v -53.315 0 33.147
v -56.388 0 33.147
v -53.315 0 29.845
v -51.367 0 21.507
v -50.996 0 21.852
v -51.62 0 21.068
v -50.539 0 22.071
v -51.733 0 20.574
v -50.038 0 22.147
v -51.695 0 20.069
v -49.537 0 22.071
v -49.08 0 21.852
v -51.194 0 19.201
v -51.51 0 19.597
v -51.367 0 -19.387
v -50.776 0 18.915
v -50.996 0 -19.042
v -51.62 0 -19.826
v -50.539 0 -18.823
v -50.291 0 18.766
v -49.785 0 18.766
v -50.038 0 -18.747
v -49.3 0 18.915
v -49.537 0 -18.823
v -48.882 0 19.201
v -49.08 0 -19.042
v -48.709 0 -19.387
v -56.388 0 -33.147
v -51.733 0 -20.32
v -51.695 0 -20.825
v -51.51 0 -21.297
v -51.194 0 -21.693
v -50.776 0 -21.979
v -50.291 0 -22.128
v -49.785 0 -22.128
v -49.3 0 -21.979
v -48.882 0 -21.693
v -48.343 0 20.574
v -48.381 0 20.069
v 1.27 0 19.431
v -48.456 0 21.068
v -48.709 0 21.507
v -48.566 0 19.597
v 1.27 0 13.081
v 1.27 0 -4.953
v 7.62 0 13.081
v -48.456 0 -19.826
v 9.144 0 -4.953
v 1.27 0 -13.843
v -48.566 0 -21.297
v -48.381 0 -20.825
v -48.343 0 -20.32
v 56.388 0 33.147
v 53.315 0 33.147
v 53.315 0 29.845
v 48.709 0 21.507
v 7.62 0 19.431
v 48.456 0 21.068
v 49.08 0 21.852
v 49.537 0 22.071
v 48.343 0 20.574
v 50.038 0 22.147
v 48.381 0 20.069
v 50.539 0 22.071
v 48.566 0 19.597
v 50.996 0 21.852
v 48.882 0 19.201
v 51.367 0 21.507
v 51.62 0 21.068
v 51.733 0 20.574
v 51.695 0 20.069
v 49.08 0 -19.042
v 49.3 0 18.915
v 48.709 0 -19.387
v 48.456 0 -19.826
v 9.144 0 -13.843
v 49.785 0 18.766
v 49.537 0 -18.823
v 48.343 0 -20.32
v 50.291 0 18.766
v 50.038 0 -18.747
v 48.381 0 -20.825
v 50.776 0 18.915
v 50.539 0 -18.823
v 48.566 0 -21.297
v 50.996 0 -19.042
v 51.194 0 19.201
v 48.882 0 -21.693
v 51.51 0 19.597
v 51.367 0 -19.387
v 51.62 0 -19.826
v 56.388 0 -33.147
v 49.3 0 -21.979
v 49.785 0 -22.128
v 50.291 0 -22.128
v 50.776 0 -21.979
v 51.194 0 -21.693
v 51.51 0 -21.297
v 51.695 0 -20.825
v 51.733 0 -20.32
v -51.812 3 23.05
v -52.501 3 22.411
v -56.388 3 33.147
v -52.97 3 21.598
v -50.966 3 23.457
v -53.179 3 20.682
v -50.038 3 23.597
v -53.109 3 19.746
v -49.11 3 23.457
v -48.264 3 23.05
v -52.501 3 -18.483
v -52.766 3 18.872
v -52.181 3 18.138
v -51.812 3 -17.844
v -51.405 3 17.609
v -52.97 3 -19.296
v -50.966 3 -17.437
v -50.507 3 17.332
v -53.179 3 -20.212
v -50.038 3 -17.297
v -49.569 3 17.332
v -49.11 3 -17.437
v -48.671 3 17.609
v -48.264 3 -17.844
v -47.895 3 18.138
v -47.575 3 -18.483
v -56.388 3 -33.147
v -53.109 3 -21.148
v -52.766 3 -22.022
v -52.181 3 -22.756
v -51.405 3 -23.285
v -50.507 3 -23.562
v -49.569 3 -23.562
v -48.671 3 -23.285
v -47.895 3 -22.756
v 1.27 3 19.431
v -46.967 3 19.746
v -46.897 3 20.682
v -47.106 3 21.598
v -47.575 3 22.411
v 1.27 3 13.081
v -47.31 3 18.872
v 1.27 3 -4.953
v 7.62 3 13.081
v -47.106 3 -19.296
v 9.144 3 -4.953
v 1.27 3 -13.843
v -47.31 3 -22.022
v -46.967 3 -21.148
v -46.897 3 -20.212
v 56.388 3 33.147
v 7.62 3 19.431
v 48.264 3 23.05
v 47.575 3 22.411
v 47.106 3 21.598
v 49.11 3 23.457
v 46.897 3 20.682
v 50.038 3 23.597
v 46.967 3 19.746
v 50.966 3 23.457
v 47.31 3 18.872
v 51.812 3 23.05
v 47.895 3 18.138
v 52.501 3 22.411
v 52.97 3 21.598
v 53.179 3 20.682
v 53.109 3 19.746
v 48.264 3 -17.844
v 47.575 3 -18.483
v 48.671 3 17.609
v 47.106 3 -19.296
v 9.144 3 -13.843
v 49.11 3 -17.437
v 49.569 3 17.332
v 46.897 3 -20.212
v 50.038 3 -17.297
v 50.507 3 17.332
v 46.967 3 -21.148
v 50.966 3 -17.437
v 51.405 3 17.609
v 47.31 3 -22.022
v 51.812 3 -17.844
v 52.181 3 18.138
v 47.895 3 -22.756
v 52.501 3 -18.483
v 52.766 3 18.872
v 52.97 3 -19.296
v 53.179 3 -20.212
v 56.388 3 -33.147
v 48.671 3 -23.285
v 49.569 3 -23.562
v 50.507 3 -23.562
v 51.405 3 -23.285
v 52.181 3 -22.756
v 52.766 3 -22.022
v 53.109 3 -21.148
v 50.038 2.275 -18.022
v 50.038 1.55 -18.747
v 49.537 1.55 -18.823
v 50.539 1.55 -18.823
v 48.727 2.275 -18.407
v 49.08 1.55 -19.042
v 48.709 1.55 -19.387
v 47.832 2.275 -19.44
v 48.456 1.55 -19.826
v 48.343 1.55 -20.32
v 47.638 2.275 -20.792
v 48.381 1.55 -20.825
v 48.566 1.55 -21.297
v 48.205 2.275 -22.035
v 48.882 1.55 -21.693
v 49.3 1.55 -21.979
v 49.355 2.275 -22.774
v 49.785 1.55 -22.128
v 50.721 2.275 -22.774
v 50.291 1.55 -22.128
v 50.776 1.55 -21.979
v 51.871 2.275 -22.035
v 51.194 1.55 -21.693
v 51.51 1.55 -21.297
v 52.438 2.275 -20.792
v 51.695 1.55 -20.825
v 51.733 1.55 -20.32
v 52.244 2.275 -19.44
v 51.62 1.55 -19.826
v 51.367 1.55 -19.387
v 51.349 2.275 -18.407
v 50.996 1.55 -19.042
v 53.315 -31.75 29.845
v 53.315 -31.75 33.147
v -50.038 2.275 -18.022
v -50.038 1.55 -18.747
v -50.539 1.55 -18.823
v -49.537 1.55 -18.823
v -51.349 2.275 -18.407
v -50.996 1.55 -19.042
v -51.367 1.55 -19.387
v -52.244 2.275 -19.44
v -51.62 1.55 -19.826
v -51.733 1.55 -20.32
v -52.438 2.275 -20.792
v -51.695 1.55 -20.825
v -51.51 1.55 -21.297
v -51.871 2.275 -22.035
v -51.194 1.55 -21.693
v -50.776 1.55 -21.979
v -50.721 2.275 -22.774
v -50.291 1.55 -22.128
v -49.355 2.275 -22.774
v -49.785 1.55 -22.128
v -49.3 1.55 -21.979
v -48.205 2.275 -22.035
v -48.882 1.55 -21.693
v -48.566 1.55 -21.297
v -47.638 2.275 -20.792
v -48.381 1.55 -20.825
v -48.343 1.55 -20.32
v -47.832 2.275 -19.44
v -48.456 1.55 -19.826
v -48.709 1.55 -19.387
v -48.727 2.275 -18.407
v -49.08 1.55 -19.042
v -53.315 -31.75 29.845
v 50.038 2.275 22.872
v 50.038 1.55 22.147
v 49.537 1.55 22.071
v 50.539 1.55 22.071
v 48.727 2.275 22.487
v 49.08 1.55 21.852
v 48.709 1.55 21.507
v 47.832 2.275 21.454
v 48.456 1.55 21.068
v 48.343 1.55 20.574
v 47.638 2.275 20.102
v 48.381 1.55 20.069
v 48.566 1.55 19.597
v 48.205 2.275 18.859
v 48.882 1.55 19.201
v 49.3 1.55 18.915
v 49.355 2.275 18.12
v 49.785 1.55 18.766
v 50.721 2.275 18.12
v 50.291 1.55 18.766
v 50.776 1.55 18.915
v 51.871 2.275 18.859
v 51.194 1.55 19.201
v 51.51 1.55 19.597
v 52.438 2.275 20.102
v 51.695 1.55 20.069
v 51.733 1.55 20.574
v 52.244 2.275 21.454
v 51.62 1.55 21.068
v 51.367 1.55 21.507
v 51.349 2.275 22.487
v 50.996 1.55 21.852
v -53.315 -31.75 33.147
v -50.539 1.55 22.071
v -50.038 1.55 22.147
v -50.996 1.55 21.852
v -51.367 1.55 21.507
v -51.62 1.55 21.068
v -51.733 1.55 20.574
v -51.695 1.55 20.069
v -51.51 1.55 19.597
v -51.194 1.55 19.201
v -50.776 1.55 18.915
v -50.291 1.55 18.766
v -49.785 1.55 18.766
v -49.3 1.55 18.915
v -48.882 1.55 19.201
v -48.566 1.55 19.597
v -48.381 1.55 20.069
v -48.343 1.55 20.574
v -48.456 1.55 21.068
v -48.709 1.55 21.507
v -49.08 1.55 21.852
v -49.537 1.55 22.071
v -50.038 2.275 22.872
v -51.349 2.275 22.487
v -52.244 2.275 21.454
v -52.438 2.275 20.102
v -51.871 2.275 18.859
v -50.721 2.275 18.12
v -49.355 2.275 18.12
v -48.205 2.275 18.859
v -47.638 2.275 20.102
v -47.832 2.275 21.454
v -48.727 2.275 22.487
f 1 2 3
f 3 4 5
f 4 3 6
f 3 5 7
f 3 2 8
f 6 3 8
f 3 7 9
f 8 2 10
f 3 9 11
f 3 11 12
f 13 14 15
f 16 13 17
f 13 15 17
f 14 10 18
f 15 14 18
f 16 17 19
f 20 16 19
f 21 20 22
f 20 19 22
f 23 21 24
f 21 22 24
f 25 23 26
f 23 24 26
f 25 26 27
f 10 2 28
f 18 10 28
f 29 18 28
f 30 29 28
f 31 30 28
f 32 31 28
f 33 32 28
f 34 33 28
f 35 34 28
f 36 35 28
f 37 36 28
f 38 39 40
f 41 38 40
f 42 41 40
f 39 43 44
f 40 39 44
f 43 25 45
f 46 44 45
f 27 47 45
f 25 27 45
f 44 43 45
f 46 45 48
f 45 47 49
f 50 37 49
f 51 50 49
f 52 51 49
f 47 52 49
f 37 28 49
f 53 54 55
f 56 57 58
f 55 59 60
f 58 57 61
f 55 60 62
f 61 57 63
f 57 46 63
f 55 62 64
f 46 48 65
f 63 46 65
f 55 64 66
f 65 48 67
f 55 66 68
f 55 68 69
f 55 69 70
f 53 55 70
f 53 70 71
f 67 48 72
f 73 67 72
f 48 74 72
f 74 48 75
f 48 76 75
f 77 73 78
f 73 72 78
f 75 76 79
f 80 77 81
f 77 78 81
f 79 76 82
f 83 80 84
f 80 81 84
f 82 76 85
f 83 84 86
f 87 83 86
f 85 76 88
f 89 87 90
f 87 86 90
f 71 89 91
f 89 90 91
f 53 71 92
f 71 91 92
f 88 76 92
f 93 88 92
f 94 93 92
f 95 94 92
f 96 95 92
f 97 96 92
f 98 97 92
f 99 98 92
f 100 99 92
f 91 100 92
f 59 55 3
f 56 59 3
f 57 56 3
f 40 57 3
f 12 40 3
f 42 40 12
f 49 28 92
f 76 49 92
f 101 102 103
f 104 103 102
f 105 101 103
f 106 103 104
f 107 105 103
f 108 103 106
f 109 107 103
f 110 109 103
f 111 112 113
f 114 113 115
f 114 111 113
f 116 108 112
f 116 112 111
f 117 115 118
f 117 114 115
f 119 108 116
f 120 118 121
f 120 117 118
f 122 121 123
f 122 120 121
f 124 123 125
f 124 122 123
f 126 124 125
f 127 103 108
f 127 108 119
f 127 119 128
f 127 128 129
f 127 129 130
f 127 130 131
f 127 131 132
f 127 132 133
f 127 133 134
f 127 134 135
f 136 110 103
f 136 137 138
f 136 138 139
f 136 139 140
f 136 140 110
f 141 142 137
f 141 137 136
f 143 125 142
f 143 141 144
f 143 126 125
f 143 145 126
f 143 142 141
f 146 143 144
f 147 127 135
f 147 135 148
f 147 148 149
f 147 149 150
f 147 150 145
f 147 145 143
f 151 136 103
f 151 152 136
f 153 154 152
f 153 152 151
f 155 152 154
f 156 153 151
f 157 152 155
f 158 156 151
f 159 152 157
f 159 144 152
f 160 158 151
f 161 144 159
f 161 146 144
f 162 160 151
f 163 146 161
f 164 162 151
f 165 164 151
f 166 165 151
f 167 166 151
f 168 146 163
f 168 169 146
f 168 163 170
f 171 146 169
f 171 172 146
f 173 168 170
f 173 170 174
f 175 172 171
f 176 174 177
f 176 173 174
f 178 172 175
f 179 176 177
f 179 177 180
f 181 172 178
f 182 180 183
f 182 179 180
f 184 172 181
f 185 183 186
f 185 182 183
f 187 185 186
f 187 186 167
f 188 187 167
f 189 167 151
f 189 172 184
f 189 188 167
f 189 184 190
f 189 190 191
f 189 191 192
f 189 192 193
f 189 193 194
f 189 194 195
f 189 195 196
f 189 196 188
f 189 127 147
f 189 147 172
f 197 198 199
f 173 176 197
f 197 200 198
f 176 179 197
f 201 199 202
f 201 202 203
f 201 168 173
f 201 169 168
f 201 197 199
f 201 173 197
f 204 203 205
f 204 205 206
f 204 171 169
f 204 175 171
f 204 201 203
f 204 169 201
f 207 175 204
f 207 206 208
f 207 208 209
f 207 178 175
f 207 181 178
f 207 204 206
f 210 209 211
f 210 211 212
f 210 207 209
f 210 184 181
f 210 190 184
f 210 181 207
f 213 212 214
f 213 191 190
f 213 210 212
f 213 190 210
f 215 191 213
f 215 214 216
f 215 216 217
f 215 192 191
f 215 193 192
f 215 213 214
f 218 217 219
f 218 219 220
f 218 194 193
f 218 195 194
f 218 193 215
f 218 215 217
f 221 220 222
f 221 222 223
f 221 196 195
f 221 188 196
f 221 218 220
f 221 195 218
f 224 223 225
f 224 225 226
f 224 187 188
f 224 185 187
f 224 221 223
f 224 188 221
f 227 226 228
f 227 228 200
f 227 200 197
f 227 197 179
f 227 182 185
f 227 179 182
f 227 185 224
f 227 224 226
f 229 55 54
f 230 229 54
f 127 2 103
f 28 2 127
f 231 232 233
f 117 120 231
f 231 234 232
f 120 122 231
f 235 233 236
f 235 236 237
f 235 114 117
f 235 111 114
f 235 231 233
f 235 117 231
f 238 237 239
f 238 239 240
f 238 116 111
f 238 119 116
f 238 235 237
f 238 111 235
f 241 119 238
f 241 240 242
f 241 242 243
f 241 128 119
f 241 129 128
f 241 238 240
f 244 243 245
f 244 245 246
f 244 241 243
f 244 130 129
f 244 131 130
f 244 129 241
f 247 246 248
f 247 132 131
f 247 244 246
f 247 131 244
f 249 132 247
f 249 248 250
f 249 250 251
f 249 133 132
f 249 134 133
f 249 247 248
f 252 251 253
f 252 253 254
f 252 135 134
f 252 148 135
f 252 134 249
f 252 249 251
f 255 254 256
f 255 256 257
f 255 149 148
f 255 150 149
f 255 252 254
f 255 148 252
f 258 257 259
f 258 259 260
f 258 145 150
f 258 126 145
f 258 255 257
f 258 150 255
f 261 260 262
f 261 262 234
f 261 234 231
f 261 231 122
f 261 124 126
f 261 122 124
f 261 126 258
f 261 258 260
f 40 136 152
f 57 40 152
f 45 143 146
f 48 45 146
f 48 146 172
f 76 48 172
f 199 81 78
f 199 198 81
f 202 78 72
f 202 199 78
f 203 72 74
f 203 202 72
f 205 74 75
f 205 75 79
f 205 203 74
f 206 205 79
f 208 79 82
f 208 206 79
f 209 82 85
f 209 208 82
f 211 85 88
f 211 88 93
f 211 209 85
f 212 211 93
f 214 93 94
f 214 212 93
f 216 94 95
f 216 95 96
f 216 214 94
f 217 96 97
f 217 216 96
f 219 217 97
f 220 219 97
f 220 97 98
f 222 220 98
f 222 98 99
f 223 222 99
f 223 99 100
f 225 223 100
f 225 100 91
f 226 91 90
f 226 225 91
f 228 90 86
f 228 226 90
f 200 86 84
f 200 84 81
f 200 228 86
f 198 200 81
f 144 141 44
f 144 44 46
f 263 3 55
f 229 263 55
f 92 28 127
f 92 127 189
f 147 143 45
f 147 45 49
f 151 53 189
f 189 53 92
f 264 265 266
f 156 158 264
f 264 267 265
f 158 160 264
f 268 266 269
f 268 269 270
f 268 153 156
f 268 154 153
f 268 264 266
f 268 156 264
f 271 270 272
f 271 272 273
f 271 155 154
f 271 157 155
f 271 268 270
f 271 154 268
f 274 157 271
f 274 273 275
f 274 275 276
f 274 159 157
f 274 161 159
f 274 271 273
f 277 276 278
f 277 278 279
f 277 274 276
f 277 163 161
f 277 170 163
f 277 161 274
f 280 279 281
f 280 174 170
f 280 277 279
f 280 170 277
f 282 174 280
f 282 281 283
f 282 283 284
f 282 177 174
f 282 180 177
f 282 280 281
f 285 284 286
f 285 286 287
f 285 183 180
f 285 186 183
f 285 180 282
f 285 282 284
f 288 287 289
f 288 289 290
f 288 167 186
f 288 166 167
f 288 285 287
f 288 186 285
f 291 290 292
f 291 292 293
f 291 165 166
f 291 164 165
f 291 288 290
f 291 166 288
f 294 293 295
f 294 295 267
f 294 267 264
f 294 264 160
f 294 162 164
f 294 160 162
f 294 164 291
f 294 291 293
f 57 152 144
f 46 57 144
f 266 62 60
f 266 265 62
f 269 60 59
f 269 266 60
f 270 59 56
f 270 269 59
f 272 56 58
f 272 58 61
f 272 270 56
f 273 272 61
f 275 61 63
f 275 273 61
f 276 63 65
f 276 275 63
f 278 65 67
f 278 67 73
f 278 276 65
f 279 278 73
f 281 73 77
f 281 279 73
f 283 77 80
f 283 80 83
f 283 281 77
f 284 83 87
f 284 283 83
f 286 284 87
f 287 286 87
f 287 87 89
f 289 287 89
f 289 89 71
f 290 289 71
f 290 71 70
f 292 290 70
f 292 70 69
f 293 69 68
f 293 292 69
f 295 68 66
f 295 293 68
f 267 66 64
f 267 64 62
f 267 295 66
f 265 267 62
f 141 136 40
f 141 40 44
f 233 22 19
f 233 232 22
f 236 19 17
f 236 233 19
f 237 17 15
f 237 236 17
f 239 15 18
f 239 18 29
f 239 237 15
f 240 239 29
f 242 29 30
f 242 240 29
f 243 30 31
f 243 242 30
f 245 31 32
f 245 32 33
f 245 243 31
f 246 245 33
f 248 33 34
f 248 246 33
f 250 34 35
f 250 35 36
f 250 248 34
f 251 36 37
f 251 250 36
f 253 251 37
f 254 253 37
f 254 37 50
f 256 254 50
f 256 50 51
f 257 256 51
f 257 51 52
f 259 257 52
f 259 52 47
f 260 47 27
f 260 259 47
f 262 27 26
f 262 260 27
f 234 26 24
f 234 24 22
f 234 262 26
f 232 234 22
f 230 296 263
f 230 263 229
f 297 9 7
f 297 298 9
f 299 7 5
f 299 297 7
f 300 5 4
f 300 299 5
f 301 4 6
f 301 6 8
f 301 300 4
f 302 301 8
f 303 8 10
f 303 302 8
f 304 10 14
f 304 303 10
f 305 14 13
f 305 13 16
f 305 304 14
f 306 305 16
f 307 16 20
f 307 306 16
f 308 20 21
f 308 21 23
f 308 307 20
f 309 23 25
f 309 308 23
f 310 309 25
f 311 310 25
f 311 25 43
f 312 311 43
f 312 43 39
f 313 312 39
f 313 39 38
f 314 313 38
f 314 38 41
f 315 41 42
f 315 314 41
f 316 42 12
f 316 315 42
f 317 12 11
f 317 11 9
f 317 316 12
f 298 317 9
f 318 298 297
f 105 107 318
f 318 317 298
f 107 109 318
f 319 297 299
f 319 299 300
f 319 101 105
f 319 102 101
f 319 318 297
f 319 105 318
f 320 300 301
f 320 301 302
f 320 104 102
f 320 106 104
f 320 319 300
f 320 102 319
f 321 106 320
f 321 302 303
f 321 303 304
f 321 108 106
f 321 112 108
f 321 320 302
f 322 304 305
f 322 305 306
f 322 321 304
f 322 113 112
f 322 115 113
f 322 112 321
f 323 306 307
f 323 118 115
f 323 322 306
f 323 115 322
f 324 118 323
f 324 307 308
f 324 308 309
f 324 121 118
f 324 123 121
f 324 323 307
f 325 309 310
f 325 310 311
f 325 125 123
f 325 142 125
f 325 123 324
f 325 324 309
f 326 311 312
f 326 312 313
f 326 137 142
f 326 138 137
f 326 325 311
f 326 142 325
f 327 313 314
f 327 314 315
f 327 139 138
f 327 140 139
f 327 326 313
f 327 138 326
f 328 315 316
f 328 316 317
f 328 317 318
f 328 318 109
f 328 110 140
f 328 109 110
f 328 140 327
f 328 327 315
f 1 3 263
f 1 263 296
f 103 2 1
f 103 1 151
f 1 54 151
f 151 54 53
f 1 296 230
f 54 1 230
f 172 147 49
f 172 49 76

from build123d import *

# Parameters (mm, degrees)
SKETCH1_W                                    = 112.776
SKETCH1_H                                    = 66.294
BOSS_EXTRUDE1_DEPTH                          = 3
CSK_FOR_M3_COUNTERSUNK_FLAT_HEAD_SCR_2_COUNT = 2
CSK_FOR_M3_COUNTERSUNK_FLAT_HEAD_SCR_2_PITCH = 40.894
CSK_FOR_M3_COUNTERSUNK_FLAT_HEAD_SCR_3_COUNT = 2
CSK_FOR_M3_COUNTERSUNK_FLAT_HEAD_SCR_3_PITCH = 108.108857232
CSK_FOR_M3_COUNTERSUNK_FLAT_HEAD_SCR_4_COUNT = 2
CSK_FOR_M3_COUNTERSUNK_FLAT_HEAD_SCR_4_PITCH = 100.076
SKETCH4_W                                    = 106.6292
SKETCH4_H                                    = 3.302
BOSS_EXTRUDE2_DEPTH                          = 31.75
CUT_EXTRUDE1_REACH                           = 76.067
SKETCH6_W                                    = 6.35
SKETCH6_H                                    = 6.35
SKETCH6_W_2                                  = 7.874
SKETCH6_H_2                                  = 8.89


with BuildPart() as part:
    # Sketch1 → Boss-Extrude1 (new body)
    with BuildSketch(Plane(origin=(0, 0, 0), x_dir=(1, 0, 0), z_dir=(0, 1, 0))):
        Rectangle(SKETCH1_W, SKETCH1_H)
    extrude(amount=BOSS_EXTRUDE1_DEPTH)

    # Sketch3 → CSK for M3 Countersunk Flat Head Screw1 (revolve, cut)
    with BuildSketch(Plane(origin=(-50.038, 3, -20.447), x_dir=(0, 0, 1), z_dir=(1, 0, 0))):
        Polygon((0, 0), (0, 3), (1.7, 3), (1.7, 1.45), (3.15, 0), align=None)
    csk_for_m3_countersunk_flat_head_screw1 = revolve(axis=Axis((-50.038, 9.35, -20.447), (0, -1, 0)), mode=Mode.SUBTRACT)

    # CSK for M3 Countersunk Flat Head Scr 2: CSK for M3 Countersunk Flat Head Screw1 ×2
    with Locations(*[(0, 0, i * CSK_FOR_M3_COUNTERSUNK_FLAT_HEAD_SCR_2_PITCH) for i in range(1, CSK_FOR_M3_COUNTERSUNK_FLAT_HEAD_SCR_2_COUNT)]):
        add(csk_for_m3_countersunk_flat_head_screw1, mode=Mode.SUBTRACT)

    # CSK for M3 Countersunk Flat Head Scr 3: CSK for M3 Countersunk Flat Head Screw1 ×2
    with Locations(*[Vector(0.9256965854821381, 0, 0.3782668788391479) * (i * CSK_FOR_M3_COUNTERSUNK_FLAT_HEAD_SCR_3_PITCH) for i in range(1, CSK_FOR_M3_COUNTERSUNK_FLAT_HEAD_SCR_3_COUNT)]):
        add(csk_for_m3_countersunk_flat_head_screw1, mode=Mode.SUBTRACT)

    # CSK for M3 Countersunk Flat Head Scr 4: CSK for M3 Countersunk Flat Head Screw1 ×2
    with Locations(*[(i * CSK_FOR_M3_COUNTERSUNK_FLAT_HEAD_SCR_4_PITCH, 0, 0) for i in range(1, CSK_FOR_M3_COUNTERSUNK_FLAT_HEAD_SCR_4_COUNT)]):
        add(csk_for_m3_countersunk_flat_head_screw1, mode=Mode.SUBTRACT)

    # Sketch4 → Boss-Extrude2 (add)
    with BuildSketch(Plane.XZ):
        with Locations((0, 31.496)):
            Rectangle(SKETCH4_W, SKETCH4_H)
    extrude(amount=BOSS_EXTRUDE2_DEPTH)

    # Sketch6 → Cut-Extrude1 (cut, up to next)
    with BuildSketch(Plane(origin=(0, 3, 0), x_dir=(1, 0, 0), z_dir=(0, 1, 0)), mode=Mode.PRIVATE) as cut_extrude1_sk1:
        with Locations((4.445, -16.256)):
            Rectangle(SKETCH6_W, SKETCH6_H)
    cut_extrude1_tool1 = extrude(cut_extrude1_sk1.sketch, amount=-CUT_EXTRUDE1_REACH, mode=Mode.PRIVATE) & part.part
    # Sketch6 → Cut-Extrude1 (cut, up to next)
    with BuildSketch(Plane(origin=(0, 3, 0), x_dir=(1, 0, 0), z_dir=(0, 1, 0)), mode=Mode.PRIVATE) as cut_extrude1_sk2:
        with Locations((5.207, 9.398)):
            Rectangle(SKETCH6_W_2, SKETCH6_H_2)
    cut_extrude1_tool2 = extrude(cut_extrude1_sk2.sketch, amount=-CUT_EXTRUDE1_REACH, mode=Mode.PRIVATE) & part.part
    add(cut_extrude1_tool1.solids().sort_by_distance((4.445, 3, 16.256))[0], mode=Mode.SUBTRACT)
    add(cut_extrude1_tool2.solids().sort_by_distance((5.207, 3, -9.398))[0], mode=Mode.SUBTRACT)


solid = part.part
